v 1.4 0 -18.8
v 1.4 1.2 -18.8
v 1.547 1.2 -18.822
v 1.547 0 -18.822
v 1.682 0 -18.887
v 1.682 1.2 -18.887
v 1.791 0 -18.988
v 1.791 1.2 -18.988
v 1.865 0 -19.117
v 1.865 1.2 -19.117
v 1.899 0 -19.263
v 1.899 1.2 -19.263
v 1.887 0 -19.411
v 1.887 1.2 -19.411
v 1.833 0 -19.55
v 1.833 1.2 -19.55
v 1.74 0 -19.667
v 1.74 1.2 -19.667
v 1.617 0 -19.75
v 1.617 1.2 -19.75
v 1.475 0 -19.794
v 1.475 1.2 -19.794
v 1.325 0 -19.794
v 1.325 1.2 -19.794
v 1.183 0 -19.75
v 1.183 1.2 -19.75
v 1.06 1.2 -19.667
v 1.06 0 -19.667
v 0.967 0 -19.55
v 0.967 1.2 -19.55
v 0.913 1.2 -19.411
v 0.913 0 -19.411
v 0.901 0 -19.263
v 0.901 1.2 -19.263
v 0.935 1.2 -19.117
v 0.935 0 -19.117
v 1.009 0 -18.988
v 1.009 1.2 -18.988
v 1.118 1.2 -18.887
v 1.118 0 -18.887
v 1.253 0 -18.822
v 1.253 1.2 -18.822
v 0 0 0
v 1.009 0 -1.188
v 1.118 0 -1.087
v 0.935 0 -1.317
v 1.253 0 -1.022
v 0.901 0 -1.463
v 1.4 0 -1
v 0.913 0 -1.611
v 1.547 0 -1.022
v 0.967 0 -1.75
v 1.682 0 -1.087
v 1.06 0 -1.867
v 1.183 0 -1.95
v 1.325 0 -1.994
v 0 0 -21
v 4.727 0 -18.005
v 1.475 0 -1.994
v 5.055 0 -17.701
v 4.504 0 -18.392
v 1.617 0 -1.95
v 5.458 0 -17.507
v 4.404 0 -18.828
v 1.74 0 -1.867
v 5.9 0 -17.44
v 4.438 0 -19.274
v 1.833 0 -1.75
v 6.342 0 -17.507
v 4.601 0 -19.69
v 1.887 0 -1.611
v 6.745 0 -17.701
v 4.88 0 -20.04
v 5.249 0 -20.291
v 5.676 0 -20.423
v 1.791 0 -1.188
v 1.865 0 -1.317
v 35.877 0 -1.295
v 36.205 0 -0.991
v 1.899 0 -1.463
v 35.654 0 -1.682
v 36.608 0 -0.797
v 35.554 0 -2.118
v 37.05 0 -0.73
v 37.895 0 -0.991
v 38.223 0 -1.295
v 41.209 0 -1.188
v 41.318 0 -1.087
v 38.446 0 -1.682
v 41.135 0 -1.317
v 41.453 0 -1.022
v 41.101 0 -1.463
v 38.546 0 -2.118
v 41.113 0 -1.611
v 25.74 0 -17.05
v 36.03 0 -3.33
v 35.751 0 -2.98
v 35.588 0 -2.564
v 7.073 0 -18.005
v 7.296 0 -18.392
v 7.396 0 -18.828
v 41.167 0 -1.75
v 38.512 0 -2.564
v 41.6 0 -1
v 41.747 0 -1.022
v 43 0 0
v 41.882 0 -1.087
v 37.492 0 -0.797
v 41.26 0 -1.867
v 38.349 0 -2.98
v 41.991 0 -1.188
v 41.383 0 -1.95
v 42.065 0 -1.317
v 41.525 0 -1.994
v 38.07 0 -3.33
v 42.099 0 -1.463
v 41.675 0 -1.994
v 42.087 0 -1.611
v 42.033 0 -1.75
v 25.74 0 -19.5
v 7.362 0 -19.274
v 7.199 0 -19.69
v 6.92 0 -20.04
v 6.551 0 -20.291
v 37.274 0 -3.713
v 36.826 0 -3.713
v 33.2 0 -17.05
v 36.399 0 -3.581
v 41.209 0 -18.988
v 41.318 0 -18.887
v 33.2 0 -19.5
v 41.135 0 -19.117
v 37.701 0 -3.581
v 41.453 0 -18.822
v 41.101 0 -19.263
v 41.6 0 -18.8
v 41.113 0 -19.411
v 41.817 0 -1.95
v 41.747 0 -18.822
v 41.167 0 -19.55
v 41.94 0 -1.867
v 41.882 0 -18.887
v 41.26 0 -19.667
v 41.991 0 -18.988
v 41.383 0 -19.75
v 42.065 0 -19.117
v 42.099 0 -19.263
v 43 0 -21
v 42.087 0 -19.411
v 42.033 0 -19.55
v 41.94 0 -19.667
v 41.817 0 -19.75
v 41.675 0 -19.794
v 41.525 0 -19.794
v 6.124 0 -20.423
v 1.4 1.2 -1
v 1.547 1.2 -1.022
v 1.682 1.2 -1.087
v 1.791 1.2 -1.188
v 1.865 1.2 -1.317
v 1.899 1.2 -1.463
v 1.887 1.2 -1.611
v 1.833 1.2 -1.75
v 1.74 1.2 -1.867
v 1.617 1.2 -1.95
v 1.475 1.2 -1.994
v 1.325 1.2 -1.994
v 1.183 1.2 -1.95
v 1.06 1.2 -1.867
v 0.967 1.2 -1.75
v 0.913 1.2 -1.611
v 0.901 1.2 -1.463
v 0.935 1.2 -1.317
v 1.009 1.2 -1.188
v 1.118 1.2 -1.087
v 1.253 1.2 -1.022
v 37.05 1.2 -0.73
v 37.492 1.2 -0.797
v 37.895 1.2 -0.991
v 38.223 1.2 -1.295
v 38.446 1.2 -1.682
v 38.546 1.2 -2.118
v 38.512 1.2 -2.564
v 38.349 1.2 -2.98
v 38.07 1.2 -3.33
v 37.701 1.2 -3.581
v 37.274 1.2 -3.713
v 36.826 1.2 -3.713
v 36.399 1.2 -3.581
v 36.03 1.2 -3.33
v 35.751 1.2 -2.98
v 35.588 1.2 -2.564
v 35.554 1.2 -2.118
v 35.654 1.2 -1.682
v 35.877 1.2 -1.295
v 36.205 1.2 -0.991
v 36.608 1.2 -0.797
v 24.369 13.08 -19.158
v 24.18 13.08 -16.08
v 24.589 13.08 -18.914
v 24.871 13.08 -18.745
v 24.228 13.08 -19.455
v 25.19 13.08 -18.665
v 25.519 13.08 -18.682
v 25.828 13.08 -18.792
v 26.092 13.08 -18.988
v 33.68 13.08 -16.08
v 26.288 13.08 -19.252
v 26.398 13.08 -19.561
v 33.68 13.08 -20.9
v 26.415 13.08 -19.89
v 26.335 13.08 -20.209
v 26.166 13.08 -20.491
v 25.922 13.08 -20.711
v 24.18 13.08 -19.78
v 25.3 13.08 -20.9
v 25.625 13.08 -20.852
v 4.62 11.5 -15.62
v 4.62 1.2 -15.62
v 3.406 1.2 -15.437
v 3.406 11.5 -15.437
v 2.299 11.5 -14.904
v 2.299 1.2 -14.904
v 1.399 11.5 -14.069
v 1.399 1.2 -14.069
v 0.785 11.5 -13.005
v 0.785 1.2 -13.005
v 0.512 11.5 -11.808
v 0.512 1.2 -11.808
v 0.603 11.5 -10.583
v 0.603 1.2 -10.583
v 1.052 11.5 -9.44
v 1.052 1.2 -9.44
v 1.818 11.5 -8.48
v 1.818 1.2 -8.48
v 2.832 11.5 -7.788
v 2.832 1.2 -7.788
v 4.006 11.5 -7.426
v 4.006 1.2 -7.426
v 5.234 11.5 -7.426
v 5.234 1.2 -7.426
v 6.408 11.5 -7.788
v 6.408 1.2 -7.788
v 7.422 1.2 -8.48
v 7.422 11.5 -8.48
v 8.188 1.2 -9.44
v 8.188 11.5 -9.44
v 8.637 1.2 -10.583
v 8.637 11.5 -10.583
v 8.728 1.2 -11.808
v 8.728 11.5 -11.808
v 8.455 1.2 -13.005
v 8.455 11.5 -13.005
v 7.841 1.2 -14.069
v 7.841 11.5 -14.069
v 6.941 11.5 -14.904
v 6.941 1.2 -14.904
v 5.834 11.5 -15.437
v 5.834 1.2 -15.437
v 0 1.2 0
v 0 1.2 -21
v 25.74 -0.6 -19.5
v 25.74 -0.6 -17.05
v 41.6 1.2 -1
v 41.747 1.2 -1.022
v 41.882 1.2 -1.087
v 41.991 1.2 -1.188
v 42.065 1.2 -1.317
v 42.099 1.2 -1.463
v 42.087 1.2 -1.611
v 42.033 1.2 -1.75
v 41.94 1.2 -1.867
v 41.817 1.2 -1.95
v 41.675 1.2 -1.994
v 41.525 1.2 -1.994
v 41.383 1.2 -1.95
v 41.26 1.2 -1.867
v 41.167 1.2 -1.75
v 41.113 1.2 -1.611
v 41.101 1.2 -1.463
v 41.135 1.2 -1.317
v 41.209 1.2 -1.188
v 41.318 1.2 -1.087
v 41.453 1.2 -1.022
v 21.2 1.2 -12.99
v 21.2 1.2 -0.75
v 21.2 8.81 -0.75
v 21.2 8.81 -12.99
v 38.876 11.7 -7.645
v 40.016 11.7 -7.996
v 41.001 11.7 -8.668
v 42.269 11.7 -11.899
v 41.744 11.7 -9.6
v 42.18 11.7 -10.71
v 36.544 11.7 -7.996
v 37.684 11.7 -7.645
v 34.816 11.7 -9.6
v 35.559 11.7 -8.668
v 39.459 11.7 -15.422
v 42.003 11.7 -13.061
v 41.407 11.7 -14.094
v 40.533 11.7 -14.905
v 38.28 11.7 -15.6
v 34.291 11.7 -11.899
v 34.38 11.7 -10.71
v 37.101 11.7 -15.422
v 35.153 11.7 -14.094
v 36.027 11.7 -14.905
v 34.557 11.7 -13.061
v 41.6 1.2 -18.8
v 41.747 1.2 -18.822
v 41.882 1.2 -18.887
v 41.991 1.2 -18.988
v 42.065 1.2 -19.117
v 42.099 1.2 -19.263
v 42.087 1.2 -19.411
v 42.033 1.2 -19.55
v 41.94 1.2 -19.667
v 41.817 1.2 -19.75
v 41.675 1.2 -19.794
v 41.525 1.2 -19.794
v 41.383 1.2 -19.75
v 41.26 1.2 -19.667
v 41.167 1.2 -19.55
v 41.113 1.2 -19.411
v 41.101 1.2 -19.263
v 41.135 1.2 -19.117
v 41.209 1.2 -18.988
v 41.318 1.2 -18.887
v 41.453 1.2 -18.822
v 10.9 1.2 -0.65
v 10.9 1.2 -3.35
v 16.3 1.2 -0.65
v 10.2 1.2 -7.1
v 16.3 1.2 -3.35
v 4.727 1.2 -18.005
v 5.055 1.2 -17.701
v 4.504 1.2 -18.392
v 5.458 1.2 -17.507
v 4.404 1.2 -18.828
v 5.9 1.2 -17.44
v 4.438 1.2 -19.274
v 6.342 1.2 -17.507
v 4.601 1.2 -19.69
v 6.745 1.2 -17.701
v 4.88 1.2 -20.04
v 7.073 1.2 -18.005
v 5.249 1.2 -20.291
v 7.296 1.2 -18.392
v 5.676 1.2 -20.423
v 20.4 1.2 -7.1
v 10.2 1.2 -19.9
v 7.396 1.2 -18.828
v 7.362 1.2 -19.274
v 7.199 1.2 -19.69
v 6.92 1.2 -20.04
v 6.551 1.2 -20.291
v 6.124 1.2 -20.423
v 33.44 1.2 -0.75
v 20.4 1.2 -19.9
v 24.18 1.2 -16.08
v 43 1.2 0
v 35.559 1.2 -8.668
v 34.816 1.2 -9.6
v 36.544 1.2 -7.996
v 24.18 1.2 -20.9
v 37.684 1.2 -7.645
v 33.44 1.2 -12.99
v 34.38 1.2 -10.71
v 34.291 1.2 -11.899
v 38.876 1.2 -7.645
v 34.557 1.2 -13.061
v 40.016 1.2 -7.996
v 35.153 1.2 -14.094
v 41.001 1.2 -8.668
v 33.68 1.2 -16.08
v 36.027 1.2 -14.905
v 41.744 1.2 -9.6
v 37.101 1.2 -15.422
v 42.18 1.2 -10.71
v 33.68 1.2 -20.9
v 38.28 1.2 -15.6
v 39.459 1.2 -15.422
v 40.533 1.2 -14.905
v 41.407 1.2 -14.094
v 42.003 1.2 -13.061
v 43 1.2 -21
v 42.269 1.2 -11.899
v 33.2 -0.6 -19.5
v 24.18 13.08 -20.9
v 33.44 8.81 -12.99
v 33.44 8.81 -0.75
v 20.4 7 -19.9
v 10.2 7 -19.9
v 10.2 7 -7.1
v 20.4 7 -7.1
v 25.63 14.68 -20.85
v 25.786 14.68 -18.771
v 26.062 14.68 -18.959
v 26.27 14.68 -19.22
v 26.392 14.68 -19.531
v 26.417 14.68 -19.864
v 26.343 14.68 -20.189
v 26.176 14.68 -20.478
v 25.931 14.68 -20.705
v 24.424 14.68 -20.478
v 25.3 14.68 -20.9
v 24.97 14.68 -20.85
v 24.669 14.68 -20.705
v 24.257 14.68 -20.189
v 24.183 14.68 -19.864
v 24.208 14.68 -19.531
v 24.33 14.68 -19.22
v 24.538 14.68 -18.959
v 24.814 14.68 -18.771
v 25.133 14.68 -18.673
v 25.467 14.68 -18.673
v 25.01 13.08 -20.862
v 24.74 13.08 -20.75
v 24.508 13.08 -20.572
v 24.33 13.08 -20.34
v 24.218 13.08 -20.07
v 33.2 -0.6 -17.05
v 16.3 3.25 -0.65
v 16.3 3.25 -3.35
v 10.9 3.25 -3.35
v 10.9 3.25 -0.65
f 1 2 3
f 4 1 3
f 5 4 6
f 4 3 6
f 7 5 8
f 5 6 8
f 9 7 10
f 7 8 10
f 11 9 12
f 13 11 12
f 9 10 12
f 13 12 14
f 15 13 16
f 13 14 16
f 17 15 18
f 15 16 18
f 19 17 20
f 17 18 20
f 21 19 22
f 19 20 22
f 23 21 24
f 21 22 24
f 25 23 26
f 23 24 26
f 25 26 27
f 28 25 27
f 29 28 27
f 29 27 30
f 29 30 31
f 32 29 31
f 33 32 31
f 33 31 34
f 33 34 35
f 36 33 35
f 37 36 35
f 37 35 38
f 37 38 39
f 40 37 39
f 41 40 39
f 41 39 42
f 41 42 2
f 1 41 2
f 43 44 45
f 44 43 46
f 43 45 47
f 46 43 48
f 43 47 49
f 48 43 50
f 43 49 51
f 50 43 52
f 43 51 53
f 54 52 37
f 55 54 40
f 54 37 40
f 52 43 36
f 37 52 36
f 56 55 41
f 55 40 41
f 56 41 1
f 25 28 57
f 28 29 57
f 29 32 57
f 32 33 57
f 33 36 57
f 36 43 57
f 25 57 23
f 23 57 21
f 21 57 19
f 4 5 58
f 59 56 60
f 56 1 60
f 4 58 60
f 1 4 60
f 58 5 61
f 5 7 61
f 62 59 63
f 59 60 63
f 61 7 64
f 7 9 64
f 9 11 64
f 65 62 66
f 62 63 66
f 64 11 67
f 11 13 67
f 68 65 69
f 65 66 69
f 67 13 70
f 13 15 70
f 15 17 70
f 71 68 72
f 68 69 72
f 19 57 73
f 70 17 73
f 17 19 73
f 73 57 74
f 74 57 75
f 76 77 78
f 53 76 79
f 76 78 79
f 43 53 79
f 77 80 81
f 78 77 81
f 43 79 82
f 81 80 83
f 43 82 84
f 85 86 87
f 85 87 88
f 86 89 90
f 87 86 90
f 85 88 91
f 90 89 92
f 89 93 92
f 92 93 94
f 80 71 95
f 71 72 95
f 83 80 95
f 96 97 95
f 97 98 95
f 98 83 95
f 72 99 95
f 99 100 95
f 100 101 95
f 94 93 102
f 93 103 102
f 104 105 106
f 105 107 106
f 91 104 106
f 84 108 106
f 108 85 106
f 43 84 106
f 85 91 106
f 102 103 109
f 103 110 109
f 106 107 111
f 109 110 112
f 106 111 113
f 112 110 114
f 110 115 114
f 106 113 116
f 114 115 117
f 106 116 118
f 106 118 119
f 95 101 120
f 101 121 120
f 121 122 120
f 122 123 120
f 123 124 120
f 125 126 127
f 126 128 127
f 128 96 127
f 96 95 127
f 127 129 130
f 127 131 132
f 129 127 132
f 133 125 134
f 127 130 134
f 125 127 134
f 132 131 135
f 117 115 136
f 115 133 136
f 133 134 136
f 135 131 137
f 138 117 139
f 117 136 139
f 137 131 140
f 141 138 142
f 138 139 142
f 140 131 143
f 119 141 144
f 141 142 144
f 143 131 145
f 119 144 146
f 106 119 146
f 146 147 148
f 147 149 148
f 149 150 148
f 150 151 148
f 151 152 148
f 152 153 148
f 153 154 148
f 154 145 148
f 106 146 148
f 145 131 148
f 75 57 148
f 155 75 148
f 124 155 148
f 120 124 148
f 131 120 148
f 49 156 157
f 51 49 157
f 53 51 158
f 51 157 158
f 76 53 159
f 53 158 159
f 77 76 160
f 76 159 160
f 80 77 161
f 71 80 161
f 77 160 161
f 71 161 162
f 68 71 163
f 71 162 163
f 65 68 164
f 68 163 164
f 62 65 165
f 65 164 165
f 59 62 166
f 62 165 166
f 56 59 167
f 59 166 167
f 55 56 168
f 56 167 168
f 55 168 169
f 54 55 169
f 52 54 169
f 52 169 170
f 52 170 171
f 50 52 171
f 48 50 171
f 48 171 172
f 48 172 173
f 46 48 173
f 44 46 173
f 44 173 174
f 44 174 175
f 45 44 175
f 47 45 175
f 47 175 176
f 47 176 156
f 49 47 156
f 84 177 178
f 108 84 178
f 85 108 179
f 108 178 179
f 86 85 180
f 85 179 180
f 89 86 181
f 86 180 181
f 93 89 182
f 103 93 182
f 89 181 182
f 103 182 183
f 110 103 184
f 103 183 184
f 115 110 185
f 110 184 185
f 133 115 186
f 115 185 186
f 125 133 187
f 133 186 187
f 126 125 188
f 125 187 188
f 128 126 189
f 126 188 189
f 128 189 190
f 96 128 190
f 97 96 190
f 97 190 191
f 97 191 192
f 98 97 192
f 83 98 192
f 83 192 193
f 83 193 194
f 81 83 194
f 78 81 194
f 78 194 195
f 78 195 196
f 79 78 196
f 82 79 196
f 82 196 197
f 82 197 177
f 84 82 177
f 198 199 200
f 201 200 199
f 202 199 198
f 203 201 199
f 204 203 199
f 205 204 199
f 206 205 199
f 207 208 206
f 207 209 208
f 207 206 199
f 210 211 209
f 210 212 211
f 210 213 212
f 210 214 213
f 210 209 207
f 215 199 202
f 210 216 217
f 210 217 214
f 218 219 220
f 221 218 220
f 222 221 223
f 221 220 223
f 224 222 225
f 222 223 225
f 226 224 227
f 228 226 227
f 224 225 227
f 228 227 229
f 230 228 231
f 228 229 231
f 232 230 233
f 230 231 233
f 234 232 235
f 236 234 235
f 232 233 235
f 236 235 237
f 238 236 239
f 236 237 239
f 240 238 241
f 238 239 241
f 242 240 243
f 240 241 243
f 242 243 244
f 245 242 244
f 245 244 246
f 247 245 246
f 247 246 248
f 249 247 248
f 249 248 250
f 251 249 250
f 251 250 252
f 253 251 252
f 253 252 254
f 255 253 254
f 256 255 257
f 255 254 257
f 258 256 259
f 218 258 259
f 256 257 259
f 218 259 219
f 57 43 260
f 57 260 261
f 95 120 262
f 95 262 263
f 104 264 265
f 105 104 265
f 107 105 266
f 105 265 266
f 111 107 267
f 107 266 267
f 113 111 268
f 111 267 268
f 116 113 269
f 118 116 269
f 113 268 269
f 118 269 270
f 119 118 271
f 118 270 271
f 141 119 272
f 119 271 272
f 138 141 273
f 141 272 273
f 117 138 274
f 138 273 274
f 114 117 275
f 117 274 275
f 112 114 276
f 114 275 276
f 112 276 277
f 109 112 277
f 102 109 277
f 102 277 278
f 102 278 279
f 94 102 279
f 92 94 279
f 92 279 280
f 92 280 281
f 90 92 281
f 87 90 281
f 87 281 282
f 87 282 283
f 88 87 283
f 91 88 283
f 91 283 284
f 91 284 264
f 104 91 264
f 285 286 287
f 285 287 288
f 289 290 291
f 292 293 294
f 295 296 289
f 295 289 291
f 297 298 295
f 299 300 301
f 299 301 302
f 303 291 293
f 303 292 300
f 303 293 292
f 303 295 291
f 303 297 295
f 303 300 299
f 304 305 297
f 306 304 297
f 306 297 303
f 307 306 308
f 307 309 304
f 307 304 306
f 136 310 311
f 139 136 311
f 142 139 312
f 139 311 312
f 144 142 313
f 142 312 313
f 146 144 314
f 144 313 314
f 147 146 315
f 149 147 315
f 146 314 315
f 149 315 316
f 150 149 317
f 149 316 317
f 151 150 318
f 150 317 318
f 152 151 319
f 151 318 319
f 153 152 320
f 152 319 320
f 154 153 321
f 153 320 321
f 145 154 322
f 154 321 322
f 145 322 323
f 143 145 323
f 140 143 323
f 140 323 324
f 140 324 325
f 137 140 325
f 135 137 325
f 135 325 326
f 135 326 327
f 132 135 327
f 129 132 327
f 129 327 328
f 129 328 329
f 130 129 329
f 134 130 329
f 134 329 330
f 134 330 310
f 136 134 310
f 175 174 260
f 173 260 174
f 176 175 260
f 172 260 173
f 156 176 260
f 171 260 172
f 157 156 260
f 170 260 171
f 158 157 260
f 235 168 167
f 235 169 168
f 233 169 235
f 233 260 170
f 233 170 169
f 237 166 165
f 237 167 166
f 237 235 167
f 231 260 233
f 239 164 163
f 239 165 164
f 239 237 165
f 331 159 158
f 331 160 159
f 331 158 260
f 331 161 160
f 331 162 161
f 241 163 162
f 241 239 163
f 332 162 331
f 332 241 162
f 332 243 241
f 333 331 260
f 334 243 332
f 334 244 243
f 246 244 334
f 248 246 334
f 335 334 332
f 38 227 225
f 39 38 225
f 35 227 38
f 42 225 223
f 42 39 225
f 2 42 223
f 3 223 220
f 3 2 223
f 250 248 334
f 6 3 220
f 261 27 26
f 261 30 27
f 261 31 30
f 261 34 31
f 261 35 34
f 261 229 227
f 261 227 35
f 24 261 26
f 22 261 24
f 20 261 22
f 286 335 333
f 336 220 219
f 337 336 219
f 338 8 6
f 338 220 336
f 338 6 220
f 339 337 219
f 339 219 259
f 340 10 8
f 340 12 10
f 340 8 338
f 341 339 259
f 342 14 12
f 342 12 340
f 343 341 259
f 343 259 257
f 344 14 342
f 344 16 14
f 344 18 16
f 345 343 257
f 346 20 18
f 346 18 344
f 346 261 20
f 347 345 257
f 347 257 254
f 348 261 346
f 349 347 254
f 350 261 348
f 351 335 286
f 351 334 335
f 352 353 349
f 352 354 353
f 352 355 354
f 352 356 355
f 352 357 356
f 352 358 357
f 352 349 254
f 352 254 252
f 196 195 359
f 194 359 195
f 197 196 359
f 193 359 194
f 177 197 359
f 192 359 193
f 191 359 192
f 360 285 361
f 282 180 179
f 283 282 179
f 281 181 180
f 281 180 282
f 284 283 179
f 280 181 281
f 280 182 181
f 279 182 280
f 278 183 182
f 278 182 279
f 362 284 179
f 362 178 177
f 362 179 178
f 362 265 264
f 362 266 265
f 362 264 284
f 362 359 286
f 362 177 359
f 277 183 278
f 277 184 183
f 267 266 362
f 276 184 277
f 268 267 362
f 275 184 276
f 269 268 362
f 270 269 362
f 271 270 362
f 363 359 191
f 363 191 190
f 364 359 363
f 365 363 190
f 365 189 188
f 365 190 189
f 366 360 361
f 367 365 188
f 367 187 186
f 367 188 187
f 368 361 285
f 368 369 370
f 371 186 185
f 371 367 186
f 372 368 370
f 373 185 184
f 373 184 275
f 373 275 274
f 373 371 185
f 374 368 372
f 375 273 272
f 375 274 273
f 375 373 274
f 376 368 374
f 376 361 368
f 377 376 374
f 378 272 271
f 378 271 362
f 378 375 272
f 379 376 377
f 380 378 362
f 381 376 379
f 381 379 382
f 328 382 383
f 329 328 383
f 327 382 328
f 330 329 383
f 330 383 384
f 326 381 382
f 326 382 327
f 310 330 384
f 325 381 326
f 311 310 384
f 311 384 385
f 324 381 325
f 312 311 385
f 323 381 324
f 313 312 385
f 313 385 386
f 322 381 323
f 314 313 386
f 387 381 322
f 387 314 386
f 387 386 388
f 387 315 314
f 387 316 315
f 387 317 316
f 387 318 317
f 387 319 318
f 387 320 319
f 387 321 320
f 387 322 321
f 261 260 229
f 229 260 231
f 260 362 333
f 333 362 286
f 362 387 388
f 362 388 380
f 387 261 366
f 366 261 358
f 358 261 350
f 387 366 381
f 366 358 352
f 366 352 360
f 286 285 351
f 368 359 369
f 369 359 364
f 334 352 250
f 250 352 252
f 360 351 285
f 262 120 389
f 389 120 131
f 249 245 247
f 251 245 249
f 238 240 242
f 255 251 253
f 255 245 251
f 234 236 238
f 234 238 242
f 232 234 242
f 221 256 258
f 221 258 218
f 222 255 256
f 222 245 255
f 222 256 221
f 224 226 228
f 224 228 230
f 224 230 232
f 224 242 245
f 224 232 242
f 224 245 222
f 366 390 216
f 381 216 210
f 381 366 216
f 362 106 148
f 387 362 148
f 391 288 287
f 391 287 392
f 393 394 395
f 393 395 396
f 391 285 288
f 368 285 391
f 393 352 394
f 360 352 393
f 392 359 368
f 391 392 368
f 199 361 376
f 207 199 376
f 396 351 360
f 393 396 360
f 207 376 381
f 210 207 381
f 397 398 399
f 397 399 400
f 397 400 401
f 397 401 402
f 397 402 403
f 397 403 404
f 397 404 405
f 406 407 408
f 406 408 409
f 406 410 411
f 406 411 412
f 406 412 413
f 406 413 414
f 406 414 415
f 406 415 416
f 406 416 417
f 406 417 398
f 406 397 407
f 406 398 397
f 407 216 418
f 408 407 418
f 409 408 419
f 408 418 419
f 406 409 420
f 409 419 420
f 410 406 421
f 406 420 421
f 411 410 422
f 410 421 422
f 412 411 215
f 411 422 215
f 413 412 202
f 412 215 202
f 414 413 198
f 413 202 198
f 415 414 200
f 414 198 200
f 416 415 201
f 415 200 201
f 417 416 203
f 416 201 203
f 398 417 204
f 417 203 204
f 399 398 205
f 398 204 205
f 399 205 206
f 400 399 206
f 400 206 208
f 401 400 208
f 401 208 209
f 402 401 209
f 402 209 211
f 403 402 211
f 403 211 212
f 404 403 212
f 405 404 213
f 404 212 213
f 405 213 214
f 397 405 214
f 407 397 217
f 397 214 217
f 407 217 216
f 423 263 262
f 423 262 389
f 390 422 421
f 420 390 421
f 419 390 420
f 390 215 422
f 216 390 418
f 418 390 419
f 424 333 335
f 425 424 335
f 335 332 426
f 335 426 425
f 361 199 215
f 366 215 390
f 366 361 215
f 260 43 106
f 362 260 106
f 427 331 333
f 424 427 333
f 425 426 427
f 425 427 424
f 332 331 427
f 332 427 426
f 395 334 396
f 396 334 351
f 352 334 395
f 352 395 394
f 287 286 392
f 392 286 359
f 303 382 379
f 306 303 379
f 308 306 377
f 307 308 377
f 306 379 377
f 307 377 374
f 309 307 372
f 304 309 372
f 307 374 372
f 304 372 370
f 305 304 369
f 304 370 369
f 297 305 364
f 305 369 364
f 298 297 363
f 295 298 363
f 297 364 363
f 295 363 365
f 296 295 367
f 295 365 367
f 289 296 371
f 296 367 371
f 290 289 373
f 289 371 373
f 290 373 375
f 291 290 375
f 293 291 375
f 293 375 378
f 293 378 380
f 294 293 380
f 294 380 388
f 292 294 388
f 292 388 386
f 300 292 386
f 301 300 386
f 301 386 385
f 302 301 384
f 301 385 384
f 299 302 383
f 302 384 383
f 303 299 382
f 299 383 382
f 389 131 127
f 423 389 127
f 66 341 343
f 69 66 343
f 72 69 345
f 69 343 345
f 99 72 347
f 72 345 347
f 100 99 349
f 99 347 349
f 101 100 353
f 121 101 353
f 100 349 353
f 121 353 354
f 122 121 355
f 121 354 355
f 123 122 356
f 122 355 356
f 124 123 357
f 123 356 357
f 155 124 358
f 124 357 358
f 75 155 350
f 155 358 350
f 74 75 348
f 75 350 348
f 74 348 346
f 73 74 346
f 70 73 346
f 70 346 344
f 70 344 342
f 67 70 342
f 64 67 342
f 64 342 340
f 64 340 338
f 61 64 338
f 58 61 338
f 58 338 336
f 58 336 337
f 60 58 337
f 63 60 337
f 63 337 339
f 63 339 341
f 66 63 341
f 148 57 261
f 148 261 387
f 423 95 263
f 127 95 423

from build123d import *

# Parameters (mm, degrees)
SKETCH1_W           = 43
SKETCH1_H           = 21
BOSS_EXTRUDE1_DEPTH = 1.2
SKETCH2_R           = 0.5
CUT_EXTRUDE1_DEPTH  = 48.868987873
SKETCH3_R           = 1.5
CUT_EXTRUDE2_DEPTH  = 48.868987873
SKETCH4_W           = 9.5
SKETCH4_H           = 4.82
BOSS_EXTRUDE2_DEPTH = 11.88
SKETCH5_R           = 1.12
BOSS_EXTRUDE3_DEPTH = 1.6
SKETCH6_W           = 7.46
SKETCH6_H           = 2.45
BOSS_EXTRUDE4_DEPTH = 0.6
SKETCH7_W           = 12.24
SKETCH7_H           = 12.24
BOSS_EXTRUDE5_DEPTH = 7.61
SKETCH8_W           = 10.2
SKETCH8_H           = 12.8
BOSS_EXTRUDE6_DEPTH = 5.8
SKETCH9_W           = 5.4
SKETCH9_H           = 2.7
BOSS_EXTRUDE7_DEPTH = 2.05
SKETCH10_R          = 4.12
BOSS_EXTRUDE8_DEPTH = 10.3
SKETCH11_R          = 4
BOSS_EXTRUDE9_DEPTH = 10.5


with BuildPart() as part:
    # Sketch1 → Boss-Extrude1 (new body)
    with BuildSketch(Plane(origin=(0, 0, 0), x_dir=(1, 0, 0), z_dir=(0, 1, 0))):
        with Locations((21.5, 10.5)):
            Rectangle(SKETCH1_W, SKETCH1_H)
    extrude(amount=BOSS_EXTRUDE1_DEPTH)

    # Sketch2 → Cut-Extrude1 (cut, through all)
    with BuildSketch(Plane(origin=(0, 1.2, 0), x_dir=(1, 0, 0), z_dir=(0, 1, 0))):
        with Locations((1.4, 19.3)):
            Circle(SKETCH2_R)
        with Locations((1.4, 1.5)):
            Circle(SKETCH2_R)
        with Locations((41.6, 19.3)):
            Circle(SKETCH2_R)
        with Locations((41.6, 1.5)):
            Circle(SKETCH2_R)
    extrude(amount=-CUT_EXTRUDE1_DEPTH, mode=Mode.SUBTRACT)

    # Sketch3 → Cut-Extrude2 (cut, through all)
    with BuildSketch(Plane(origin=(0, 1.2, 0), x_dir=(1, 0, 0), z_dir=(0, 1, 0))):
        with Locations((5.9, 18.94)):
            Circle(SKETCH3_R)
        with Locations((37.05, 2.23)):
            Circle(SKETCH3_R)
    extrude(amount=-CUT_EXTRUDE2_DEPTH, mode=Mode.SUBTRACT)

    # Sketch4 → Boss-Extrude2 (add)
    with BuildSketch(Plane(origin=(0, 1.2, 0), x_dir=(1, 0, 0), z_dir=(0, 1, 0))):
        with Locations((28.93, 18.49)):
            Rectangle(SKETCH4_W, SKETCH4_H)
    extrude(amount=BOSS_EXTRUDE2_DEPTH)

    # Sketch5 → Boss-Extrude3 (add)
    with BuildSketch(Plane(origin=(0, 13.08, 0), x_dir=(1, 0, 0), z_dir=(0, 1, 0))):
        with Locations((25.3, 19.78)):
            Circle(SKETCH5_R)
    extrude(amount=BOSS_EXTRUDE3_DEPTH)

    # Sketch6 → Boss-Extrude4 (add)
    with BuildSketch(Plane.XZ):
        with Locations((29.47, -18.275)):
            Rectangle(SKETCH6_W, SKETCH6_H)
    extrude(amount=BOSS_EXTRUDE4_DEPTH)

    # Sketch7 → Boss-Extrude5 (add)
    with BuildSketch(Plane(origin=(0, 1.2, 0), x_dir=(1, 0, 0), z_dir=(0, 1, 0))):
        with Locations((27.32, 6.87)):
            Rectangle(SKETCH7_W, SKETCH7_H)
    extrude(amount=BOSS_EXTRUDE5_DEPTH)

    # Sketch8 → Boss-Extrude6 (add)
    with BuildSketch(Plane(origin=(0, 1.2, 0), x_dir=(1, 0, 0), z_dir=(0, 1, 0))):
        with Locations((15.3, 13.5)):
            Rectangle(SKETCH8_W, SKETCH8_H)
    extrude(amount=BOSS_EXTRUDE6_DEPTH)

    # Sketch9 → Boss-Extrude7 (add)
    with BuildSketch(Plane(origin=(0, 1.2, 0), x_dir=(1, 0, 0), z_dir=(0, 1, 0))):
        with Locations((13.6, 2)):
            Rectangle(SKETCH9_W, SKETCH9_H)
    extrude(amount=BOSS_EXTRUDE7_DEPTH)

    # Sketch10 → Boss-Extrude8 (add)
    with BuildSketch(Plane(origin=(0, 1.2, 0), x_dir=(1, 0, 0), z_dir=(0, 1, 0))):
        with Locations((4.62, 11.5)):
            Circle(SKETCH10_R)
    extrude(amount=BOSS_EXTRUDE8_DEPTH)

    # Sketch11 → Boss-Extrude9 (add)
    with BuildSketch(Plane(origin=(0, 1.2, 0), x_dir=(1, 0, 0), z_dir=(0, 1, 0))):
        with Locations((38.28, 11.6)):
            Circle(SKETCH11_R)
    extrude(amount=BOSS_EXTRUDE9_DEPTH)


solid = part.part
